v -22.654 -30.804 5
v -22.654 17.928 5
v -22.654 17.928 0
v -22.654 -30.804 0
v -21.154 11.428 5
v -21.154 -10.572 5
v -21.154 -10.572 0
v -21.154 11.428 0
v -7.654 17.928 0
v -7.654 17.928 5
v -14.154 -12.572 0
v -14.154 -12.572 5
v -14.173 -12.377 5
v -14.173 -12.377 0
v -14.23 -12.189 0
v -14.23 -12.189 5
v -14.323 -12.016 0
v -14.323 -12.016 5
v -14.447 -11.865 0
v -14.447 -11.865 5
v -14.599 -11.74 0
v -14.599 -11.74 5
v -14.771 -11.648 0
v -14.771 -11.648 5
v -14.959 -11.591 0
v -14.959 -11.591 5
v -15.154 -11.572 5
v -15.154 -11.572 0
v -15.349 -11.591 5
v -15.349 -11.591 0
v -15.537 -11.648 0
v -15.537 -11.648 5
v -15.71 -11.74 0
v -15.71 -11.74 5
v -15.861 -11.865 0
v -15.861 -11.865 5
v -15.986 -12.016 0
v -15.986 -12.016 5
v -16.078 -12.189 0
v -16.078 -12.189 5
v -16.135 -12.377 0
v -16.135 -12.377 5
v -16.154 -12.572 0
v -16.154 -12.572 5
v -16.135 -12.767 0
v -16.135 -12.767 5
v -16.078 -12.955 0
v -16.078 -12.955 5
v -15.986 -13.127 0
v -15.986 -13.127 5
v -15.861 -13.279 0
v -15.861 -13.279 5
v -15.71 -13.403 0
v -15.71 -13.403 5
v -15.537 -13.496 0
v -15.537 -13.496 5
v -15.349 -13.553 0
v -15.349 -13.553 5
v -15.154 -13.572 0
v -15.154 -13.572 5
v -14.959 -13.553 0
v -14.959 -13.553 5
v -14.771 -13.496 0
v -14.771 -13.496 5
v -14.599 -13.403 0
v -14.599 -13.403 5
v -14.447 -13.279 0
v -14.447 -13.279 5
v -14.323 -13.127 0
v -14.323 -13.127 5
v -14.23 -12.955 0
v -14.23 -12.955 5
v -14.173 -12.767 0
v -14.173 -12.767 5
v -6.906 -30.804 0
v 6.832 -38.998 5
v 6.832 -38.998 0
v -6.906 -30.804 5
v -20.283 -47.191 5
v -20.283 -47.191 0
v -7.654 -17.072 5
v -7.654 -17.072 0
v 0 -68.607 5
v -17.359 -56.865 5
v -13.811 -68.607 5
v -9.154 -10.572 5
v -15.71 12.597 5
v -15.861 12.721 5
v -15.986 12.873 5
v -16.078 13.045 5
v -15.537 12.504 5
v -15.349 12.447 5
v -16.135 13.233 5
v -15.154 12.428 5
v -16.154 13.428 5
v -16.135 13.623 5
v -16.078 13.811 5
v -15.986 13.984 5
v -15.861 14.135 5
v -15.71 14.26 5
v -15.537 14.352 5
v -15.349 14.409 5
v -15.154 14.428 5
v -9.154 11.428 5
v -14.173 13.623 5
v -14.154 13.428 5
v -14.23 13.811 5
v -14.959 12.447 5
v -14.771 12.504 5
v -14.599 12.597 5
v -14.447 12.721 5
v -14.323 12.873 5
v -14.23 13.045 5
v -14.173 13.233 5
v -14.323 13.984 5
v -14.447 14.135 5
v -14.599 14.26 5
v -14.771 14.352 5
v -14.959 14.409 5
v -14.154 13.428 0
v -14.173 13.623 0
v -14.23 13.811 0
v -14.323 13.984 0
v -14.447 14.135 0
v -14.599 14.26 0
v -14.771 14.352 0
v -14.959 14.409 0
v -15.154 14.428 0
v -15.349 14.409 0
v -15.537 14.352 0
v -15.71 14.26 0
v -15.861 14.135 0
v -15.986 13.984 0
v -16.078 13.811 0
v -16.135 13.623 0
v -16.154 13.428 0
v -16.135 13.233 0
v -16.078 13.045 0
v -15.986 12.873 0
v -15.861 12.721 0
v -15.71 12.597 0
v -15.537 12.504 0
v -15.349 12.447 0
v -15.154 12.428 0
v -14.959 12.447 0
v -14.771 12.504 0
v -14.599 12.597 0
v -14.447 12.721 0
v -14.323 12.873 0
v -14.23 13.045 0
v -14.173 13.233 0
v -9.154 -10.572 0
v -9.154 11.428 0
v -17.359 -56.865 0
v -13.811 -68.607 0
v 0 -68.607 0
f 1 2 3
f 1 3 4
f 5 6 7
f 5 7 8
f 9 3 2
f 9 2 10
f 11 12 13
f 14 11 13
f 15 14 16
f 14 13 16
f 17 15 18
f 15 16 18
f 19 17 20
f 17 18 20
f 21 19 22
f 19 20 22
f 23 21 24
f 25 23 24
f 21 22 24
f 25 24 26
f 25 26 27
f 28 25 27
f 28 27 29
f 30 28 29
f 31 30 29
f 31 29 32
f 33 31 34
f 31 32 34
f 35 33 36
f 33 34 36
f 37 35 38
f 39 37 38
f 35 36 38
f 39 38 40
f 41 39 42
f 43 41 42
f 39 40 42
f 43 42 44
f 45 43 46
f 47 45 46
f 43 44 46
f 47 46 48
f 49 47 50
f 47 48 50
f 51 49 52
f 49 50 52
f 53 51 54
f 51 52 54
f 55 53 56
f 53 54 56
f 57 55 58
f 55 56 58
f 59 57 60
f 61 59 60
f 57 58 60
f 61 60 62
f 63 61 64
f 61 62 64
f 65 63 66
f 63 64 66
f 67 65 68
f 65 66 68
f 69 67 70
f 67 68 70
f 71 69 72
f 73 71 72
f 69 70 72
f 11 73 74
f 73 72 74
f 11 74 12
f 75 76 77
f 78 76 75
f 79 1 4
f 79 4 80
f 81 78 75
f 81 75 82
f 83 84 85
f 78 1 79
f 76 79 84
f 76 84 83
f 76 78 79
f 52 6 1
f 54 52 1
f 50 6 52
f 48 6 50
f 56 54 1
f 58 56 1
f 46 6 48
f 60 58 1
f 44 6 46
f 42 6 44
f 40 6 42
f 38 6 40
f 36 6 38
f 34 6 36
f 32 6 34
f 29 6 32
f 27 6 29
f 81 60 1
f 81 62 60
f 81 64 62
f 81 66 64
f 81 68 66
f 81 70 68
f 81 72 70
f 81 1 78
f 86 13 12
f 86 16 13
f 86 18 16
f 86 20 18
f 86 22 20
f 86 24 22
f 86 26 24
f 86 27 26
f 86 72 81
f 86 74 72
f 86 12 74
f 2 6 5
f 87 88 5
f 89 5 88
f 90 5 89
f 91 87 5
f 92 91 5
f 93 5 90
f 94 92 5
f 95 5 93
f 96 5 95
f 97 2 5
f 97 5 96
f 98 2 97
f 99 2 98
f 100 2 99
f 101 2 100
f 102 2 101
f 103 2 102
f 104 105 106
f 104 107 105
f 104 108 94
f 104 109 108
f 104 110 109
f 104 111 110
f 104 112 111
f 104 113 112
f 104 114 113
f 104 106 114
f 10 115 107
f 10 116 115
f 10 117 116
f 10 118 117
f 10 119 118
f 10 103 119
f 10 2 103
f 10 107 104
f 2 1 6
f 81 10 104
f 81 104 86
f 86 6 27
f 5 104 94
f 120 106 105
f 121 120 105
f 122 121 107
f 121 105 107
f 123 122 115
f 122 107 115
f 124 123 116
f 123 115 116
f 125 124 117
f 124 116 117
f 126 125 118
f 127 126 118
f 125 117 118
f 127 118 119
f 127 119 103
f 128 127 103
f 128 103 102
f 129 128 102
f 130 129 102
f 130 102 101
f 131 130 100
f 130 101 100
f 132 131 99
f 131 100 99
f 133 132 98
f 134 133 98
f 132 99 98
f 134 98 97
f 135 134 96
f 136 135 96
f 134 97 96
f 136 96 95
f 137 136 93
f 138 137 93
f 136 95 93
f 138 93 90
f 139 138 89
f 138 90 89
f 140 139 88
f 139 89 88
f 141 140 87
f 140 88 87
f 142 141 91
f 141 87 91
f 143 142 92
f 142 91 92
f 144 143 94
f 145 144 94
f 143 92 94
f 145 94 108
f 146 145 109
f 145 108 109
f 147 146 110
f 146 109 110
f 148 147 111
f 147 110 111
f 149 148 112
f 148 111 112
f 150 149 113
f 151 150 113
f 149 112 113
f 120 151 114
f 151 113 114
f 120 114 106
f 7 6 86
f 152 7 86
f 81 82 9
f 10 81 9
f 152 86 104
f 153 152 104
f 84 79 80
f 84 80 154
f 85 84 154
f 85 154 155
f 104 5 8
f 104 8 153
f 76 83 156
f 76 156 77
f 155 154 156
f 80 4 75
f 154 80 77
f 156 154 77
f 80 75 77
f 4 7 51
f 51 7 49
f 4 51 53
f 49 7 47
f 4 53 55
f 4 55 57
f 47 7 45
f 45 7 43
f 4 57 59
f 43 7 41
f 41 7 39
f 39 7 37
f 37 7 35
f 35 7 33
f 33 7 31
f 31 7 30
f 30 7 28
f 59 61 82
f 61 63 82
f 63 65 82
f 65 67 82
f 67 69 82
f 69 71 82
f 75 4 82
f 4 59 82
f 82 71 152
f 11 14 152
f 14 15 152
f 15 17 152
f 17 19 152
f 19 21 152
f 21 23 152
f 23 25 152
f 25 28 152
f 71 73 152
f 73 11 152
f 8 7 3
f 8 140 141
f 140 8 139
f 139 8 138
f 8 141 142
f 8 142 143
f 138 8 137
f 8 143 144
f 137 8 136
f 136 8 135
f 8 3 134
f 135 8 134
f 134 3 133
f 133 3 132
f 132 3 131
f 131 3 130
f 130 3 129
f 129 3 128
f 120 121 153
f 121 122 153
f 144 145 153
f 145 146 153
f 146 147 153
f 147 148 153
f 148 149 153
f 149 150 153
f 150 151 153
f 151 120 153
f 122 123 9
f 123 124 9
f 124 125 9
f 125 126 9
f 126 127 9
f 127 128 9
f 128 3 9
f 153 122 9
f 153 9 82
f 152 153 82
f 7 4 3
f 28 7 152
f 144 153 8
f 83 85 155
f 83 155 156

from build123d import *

# Parameters (mm, degrees)
SKETCH1_W           = 15
SKETCH1_H           = 35
BOSS_EXTRUDE1_DEPTH = 5
SKETCH2_R           = 1
SKETCH2_W           = 12
SKETCH2_H           = 22
CUT_EXTRUDE1_DEPTH  = 5
BOSS_EXTRUDE2_DEPTH = 5


with BuildPart() as part:
    # Sketch1 → Boss-Extrude1 (new body)
    with BuildSketch(Plane.XY):
        with Locations((-15.154109589, 0.428082192)):
            Rectangle(SKETCH1_W, SKETCH1_H)
    extrude(amount=BOSS_EXTRUDE1_DEPTH)

    # Sketch2 → Cut-Extrude1 (cut)
    with BuildSketch(Plane.XY.offset(5)):
        with Locations((-15.154109589, -12.571917808)):
            Circle(SKETCH2_R)
        with Locations((-15.154109589, 13.428082192)):
            Circle(SKETCH2_R)
        with Locations((-15.154109589, 0.428082192)):
            Rectangle(SKETCH2_W, SKETCH2_H)
    extrude(amount=-CUT_EXTRUDE1_DEPTH, mode=Mode.SUBTRACT)

    # Sketch3 → Boss-Extrude2 (add)
    with BuildSketch(Plane.XY.offset(5)):
        Polygon((-22.654109589, -17.071917808), (-22.654109589, -30.804233772), (-20.282646179, -47.190952111), (-17.359431797, -56.865022466), (-13.811210888, -68.607486145), (0, -68.607486145), (6.832413717, -38.997592941), (-6.905605444, -30.804233772), (-7.654109589, -17.071917808), align=None)
    extrude(amount=-BOSS_EXTRUDE2_DEPTH)


solid = part.part
